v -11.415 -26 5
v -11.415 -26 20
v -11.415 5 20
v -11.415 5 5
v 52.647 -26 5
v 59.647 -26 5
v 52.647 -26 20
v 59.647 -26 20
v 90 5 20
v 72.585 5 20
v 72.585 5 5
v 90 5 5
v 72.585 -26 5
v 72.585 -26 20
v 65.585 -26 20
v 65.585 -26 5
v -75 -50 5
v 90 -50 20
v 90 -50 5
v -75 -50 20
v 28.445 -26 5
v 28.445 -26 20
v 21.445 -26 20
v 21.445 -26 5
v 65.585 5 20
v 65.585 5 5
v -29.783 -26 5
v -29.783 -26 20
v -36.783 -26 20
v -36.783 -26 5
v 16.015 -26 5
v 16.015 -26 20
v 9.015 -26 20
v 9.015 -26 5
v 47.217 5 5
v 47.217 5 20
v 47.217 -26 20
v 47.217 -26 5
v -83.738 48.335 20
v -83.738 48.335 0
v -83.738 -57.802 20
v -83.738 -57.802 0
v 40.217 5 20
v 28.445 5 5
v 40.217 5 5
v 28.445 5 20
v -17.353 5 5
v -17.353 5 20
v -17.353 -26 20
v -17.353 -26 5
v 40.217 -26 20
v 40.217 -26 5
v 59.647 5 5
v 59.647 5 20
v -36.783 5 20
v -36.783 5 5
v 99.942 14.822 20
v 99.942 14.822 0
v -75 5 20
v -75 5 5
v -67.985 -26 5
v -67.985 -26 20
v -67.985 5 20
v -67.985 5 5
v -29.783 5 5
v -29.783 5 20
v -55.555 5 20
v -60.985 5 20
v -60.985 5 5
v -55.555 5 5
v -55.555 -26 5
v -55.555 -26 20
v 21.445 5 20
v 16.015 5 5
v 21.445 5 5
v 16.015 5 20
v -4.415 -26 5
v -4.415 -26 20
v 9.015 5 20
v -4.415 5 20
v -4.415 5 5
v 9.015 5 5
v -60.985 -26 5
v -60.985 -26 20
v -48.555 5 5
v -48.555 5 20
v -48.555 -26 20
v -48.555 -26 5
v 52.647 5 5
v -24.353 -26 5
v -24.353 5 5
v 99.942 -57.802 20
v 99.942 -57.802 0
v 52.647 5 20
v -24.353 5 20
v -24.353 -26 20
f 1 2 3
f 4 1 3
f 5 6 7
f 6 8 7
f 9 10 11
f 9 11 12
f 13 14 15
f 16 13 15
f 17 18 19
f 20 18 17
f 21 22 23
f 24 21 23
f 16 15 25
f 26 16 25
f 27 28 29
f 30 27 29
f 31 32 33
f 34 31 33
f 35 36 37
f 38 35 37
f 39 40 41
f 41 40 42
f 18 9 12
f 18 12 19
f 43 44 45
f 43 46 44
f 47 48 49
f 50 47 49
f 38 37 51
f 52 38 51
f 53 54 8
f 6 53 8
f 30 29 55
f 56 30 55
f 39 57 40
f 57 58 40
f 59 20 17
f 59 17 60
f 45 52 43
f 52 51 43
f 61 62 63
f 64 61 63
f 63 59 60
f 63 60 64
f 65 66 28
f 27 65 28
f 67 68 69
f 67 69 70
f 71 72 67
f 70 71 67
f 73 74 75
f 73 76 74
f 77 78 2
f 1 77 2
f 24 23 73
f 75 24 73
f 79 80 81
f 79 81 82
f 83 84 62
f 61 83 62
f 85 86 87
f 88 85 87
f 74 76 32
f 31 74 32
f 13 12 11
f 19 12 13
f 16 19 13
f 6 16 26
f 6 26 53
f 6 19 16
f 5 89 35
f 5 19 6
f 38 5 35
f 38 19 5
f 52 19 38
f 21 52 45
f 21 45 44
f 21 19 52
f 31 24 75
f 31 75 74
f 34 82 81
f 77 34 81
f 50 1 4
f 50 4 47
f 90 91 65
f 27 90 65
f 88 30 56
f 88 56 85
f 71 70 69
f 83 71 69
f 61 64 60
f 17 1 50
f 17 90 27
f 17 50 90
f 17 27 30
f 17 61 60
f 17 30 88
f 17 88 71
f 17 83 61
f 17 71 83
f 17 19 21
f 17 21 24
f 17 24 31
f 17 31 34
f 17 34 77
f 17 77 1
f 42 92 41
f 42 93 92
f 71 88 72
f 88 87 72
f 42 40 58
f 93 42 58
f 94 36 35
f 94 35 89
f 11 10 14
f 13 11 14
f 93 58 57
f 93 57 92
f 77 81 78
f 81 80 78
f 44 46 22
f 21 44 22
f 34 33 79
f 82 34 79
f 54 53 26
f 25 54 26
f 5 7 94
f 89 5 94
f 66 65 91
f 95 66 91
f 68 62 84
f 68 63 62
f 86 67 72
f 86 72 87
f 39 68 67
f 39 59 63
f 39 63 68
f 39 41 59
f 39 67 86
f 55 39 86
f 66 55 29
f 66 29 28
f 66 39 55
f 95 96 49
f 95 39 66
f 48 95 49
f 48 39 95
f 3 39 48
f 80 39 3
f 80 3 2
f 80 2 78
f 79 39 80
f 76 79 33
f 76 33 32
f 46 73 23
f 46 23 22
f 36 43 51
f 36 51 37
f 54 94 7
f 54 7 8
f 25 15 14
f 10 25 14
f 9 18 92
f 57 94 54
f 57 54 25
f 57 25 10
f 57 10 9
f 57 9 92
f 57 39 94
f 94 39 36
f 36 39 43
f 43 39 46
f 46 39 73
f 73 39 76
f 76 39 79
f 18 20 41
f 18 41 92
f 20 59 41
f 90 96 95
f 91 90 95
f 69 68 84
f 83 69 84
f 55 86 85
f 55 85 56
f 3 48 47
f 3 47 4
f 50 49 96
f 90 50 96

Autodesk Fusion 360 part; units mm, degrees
sketch "草图1" plane through (0, 0, 0) normal (0, 0, 1) x (1, 0, 0)
  line L0 (-83.7376, 48.3346) -> (-83.7376, -57.8018)
  line L1 (100, -57.8018) -> (-83.7376, -57.8018)
  line L2 (99.9425, 14.822) -> (-83.7376, 48.3346)
  line L3 (99.9425, 14.822) -> (99.9425, -57.8018)
  line L4 (-75.3044, 2.9706) -> (90.6956, 2.9706)
  line L5 (90.6956, 2.9706) -> (90.6956, -51.4889)
  line L6 (90.6956, -51.4889) -> (-75.3044, -51.4889)
  line L7 (-75.3044, -51.4889) -> (-75.3044, 2.9706)
  dimension "d1" = 166
extrude "拉伸1" add sketch "草图1" along normal blind 20 contours L0 L1 L2 L3 | L4 L5 L6 L7
sketch "草图2" plane through (0, 0, 20) normal (0, 0, 1) x (-1, 0, 0)
  line L0 (83.7376, -48.3346) -> (83.7376, 57.8018)
  line L1 (83.7376, 57.8018) -> (-99.9425, 57.8018)
  line L2 (-99.9425, 57.8018) -> (-99.9425, -14.822)
  line L3 (-99.9425, -14.822) -> (83.7376, -48.3346)
  line L4 (75, -5) -> (-90, -5)
  line L5 (-90, -5) -> (-90, 50)
  line L6 (-90, 50) -> (75, 50)
  line L7 (75, 50) -> (75, -5)
extrude "拉伸2" cut sketch "草图2" against normal blind 15 contours L4 L5 L6 L7
sketch "草图3" plane through (0, 0, 20) normal (0, 0, 1) x (-1, 0, 0)
  line L0 (-90, -5) -> (-90, 50)
  line L1 (-90, 50) -> (75, 50)
  line L2 (75, 50) -> (75, -5)
  line L3 (75, -5) -> (-90, -5)
  line L4 (83.7376, -48.3346) -> (83.7376, 57.8018)
  line L5 (83.7376, 57.8018) -> (-99.9425, 57.8018)
  line L6 (-99.9425, 57.8018) -> (-99.9425, -14.822)
  line L7 (-99.9425, -14.822) -> (83.7376, -48.3346)
  line L8 (67.985, -5) -> (60.985, -5)
  line L9 (60.985, -5) -> (60.985, 26)
  line L10 (60.985, 26) -> (67.985, 26)
  line L11 (67.985, 26) -> (67.985, -5)
  line L12 (67.985, -5) -> (60.985, -5)
  line L13 (67.985, 26) -> (67.985, -5)
  line L14 (60.985, 26) -> (67.985, 26)
  line L15 (60.985, -5) -> (60.985, 26)
  line L16 (55.5549, 26) -> (55.5549, -5)
  line L17 (55.5549, -5) -> (48.5549, -5)
  line L18 (48.5549, -5) -> (48.5549, 26)
  line L19 (48.5549, 26) -> (55.5549, 26)
  line L20 (55.5549, 26) -> (55.5549, -5)
  line L21 (48.5549, 26) -> (55.5549, 26)
  line L22 (48.5549, -5) -> (48.5549, 26)
  line L23 (55.5549, -5) -> (48.5549, -5)
  line L24 (36.7829, -5) -> (29.7829, -5)
  line L25 (36.7829, 26) -> (36.7829, -5)
  line L26 (29.7829, 26) -> (36.7829, 26)
  line L27 (29.7829, -5) -> (29.7829, 26)
  line L28 (24.3528, 26) -> (24.3528, -5)
  line L29 (17.3528, 26) -> (24.3528, 26)
  line L30 (17.3528, -5) -> (17.3528, 26)
  line L31 (24.3528, -5) -> (17.3528, -5)
  line L32 (11.4154, 26) -> (11.4154, -5)
  line L33 (4.4154, -5) -> (4.4154, 26)
  line L34 (11.4154, -5) -> (4.4154, -5)
  line L35 (4.4154, 26) -> (11.4154, 26)
  line L36 (-52.6472, -5) -> (-59.6472, -5)
  line L37 (-21.4451, 26) -> (-21.4451, -5)
  line L38 (-9.015, -5) -> (-16.015, -5)
  line L39 (-28.4451, 26) -> (-21.4451, 26)
  line L40 (-28.4451, 26) -> (-21.4451, 26)
  line L41 (-40.2171, 26) -> (-40.2171, -5)
  line L42 (-40.2171, -5) -> (-47.2171, -5)
  line L43 (-72.5846, -5) -> (-72.5846, 26)
  line L44 (-47.2171, 26) -> (-40.2171, 26)
  line L45 (-47.2171, -5) -> (-47.2171, 26)
  line L46 (-52.6472, 26) -> (-52.6472, -5)
  line L47 (-65.5846, 26) -> (-65.5846, -5)
  line L48 (-9.015, 26) -> (-9.015, -5)
  line L49 (-16.015, 26) -> (-9.015, 26)
  line L50 (-21.4451, -5) -> (-28.4451, -5)
  line L51 (-28.4451, -5) -> (-28.4451, 26)
  line L52 (-16.015, -5) -> (-16.015, 26)
  line L53 (-28.4451, -5) -> (-28.4451, 26)
  line L54 (-9.015, -5) -> (-16.015, -5)
  line L55 (-16.015, 26) -> (-9.015, 26)
  line L56 (-72.5846, 26) -> (-65.5846, 26)
  line L57 (-65.5846, -5) -> (-72.5846, -5)
  line L58 (-21.4451, 26) -> (-21.4451, -5)
  line L59 (-9.015, 26) -> (-9.015, -5)
  line L60 (-21.4451, -5) -> (-28.4451, -5)
  line L61 (-59.6472, 26) -> (-52.6472, 26)
  line L62 (-59.6472, -5) -> (-59.6472, 26)
  line L63 (-16.015, -5) -> (-16.015, 26)
  line L64 (-82.7432, 26.3749) -> (-82.7432, -4.6251)
  line L65 (-89.7432, 26.3749) -> (-82.7432, 26.3749)
  line L66 (-89.7432, -4.6251) -> (-89.7432, 26.3749)
  line L67 (-82.9307, -4.8125) -> (-89.9307, -4.8125)
  point P0 (-77, 0)
  dimension "d6" = 7
  dimension "d7" = 31
  dimension "d8" = 7
  dimension "d9" = 31
  dimension "d10" = 7
  dimension "d11" = 31
  dimension "d12" = 7
  dimension "d13" = 31
  dimension "d14" = 7
  dimension "d15" = 31
  dimension "d16" = 31
  dimension "d17" = 7
  dimension "d18" = 31
  dimension "d19" = 7
  dimension "d22" = -77
  dimension "d23" = 0
  dimension "d24" = 7
  dimension "d25" = 31
  dimension "d26" = 7
extrude "拉伸3" add sketch "草图3" against normal blind 15 contours L3 L43 L47 L56 L57 | L3 L36 L46 L61 L62 | L3 L8 L9 L10 L11 L12 L13 L14 L15 | L3 L41 L42 L44 L45 | L3 L16 L17 L18 L19 L20 L21 L22 L23 | L3 L37 L39 L40 L50 L51 L53 L58 L60 | L3 L24 L25 L26 L27 | L3 L38 L48 L49 L52 L54 L55 L59 L63 | L3 L28 L29 L30 L31 | L3 L32 L33 L34 L35
sketch "草图4" plane through (0, 0, 20) normal (0, 0, 1) x (-1, 0, 0)
  line L0 (-90, -5) -> (-90, 50)
  line L1 (-90, 50) -> (75, 50)
  line L2 (75, 50) -> (75, -5)
  line L3 (75, -5) -> (67.985, -5)
  line L4 (67.985, -5) -> (67.985, 26)
  line L5 (67.985, 26) -> (60.985, 26)
  line L6 (60.985, 26) -> (60.985, -5)
  line L7 (60.985, -5) -> (55.5549, -5)
  line L8 (55.5549, -5) -> (55.5549, 26)
  line L9 (55.5549, 26) -> (48.5549, 26)
  line L10 (48.5549, 26) -> (48.5549, -5)
  line L11 (48.5549, -5) -> (36.7829, -5)
  line L12 (36.7829, -5) -> (36.7829, 26)
  line L13 (36.7829, 26) -> (29.7829, 26)
  line L14 (29.7829, 26) -> (29.7829, -5)
  line L15 (29.7829, -5) -> (24.3528, -5)
  line L16 (24.3528, -5) -> (24.3528, 26)
  line L17 (24.3528, 26) -> (17.3528, 26)
  line L18 (17.3528, 26) -> (17.3528, -5)
  line L19 (17.3528, -5) -> (11.4154, -5)
  line L20 (11.4154, -5) -> (11.4154, 26)
  line L21 (11.4154, 26) -> (4.4154, 26)
  line L22 (4.4154, 26) -> (4.4154, -5)
  line L23 (4.4154, -5) -> (-9.015, -5)
  line L24 (-9.015, -5) -> (-9.015, 26)
  line L25 (-9.015, 26) -> (-16.015, 26)
  line L26 (-16.015, 26) -> (-16.015, -5)
  line L27 (-16.015, -5) -> (-21.4451, -5)
  line L28 (-21.4451, -5) -> (-21.4451, 26)
  line L29 (-21.4451, 26) -> (-28.4451, 26)
  line L30 (-28.4451, 26) -> (-28.4451, -5)
  line L31 (-28.4451, -5) -> (-40.2171, -5)
  line L32 (-40.2171, -5) -> (-40.2171, 26)
  line L33 (-40.2171, 26) -> (-47.2171, 26)
  line L34 (-47.2171, 26) -> (-47.2171, -5)
  line L35 (-47.2171, -5) -> (-52.6472, -5)
  line L36 (-52.6472, -5) -> (-52.6472, 26)
  line L37 (-52.6472, 26) -> (-59.6472, 26)
  line L38 (-59.6472, 26) -> (-59.6472, -5)
  line L39 (-59.6472, -5) -> (-65.5846, -5)
  line L40 (-65.5846, -5) -> (-65.5846, 26)
  line L41 (-65.5846, 26) -> (-72.5846, 26)
  line L42 (-72.5846, 26) -> (-72.5846, -5)
  line L43 (-72.5846, -5) -> (-90, -5)
  line L44 (83.7376, -48.3346) -> (83.7376, 57.8018)
  line L45 (83.7376, 57.8018) -> (-99.9425, 57.8018)
  line L46 (-99.9425, 57.8018) -> (-99.9425, -14.822)
  line L47 (-99.9425, -14.822) -> (83.7376, -48.3346)
